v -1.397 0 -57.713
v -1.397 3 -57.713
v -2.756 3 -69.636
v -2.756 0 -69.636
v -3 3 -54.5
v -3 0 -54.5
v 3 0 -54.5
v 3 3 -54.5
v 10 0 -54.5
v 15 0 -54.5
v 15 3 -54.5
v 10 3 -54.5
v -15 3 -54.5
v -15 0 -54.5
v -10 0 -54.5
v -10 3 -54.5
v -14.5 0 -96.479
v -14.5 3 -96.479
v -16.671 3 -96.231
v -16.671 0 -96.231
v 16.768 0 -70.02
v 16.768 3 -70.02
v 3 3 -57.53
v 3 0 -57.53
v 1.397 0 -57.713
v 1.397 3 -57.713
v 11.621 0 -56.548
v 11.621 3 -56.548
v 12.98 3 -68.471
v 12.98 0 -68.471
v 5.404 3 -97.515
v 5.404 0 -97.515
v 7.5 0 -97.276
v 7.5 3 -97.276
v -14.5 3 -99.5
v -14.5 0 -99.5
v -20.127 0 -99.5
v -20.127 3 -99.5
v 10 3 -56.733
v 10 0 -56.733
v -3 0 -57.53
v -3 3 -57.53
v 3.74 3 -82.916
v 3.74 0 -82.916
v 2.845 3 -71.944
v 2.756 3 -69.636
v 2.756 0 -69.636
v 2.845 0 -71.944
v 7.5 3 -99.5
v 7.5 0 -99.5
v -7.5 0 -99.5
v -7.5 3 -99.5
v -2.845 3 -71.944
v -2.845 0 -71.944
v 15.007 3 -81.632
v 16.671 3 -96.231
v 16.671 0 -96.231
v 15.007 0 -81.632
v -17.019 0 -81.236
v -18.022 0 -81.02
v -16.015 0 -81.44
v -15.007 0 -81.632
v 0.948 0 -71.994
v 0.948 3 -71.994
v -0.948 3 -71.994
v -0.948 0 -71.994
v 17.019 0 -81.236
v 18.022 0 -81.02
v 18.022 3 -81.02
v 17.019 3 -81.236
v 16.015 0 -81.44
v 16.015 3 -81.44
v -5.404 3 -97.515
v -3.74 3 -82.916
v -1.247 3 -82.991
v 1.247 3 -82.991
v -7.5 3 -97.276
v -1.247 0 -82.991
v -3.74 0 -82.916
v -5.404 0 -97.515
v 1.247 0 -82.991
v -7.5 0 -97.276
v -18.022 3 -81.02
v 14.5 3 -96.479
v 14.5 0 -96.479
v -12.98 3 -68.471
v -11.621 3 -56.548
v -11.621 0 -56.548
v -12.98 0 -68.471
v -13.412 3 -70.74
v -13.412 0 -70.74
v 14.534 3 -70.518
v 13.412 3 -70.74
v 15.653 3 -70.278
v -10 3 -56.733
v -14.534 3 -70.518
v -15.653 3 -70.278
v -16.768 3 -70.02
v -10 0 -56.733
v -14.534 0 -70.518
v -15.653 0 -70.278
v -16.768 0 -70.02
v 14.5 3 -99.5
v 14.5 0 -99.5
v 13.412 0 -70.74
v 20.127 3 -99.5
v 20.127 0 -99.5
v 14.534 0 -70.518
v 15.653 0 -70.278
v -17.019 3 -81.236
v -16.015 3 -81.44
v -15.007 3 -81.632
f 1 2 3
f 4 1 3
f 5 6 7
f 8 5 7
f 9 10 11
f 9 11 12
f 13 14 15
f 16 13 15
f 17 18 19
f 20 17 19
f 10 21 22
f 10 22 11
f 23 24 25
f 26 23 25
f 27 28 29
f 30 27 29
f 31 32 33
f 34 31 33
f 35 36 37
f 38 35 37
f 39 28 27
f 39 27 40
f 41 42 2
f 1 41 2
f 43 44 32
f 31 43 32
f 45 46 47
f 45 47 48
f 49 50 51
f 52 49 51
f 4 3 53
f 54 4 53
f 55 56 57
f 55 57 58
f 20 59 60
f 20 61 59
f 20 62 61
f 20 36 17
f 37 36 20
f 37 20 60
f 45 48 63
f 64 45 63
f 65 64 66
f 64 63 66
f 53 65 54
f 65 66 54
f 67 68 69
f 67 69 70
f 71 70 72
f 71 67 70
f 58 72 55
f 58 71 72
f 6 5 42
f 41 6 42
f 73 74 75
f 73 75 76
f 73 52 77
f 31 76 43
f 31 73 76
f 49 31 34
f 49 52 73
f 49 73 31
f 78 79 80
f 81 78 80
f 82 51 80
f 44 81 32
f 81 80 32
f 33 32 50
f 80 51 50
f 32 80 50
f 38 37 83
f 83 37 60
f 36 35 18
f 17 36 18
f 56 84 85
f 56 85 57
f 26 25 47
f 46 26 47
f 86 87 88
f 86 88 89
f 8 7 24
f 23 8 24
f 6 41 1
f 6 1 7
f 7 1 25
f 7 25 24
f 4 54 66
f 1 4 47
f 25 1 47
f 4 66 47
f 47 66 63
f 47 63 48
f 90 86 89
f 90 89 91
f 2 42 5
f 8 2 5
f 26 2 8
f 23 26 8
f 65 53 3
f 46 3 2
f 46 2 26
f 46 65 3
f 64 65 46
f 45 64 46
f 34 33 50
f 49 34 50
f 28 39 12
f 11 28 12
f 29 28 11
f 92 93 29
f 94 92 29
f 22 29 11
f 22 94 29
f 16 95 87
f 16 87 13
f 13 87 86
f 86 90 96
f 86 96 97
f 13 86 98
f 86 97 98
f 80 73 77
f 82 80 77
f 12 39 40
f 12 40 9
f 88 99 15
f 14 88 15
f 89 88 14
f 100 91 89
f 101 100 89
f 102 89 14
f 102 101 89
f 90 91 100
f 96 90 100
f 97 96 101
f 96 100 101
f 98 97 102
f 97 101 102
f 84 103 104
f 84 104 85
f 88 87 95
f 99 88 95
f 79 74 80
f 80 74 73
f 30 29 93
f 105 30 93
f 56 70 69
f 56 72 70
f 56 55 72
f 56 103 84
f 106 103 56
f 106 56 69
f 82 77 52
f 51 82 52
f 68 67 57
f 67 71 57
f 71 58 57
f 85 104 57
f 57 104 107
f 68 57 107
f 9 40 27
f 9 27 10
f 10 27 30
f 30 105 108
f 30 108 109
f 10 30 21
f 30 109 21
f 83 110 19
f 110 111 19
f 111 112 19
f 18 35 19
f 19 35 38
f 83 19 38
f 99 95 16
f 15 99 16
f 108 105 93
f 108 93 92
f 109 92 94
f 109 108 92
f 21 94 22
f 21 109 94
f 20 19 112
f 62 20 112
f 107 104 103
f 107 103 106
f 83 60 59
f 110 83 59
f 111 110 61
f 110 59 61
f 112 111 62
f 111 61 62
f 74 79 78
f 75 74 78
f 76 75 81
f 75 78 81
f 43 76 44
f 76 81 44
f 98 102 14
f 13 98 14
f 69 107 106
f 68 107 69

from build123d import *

# Parameters (mm, degrees)
BOSS_EXTRUDE1_DEPTH      = 3
CUT_EXTRUDE1_DEPTH       = 102.55958965
BOSS_EXTRUDE2_DEPTH      = 3
CUT_EXTRUDE7_DEPTH       = 102.55958965
CUT_EXTRUDE9_DEPTH       = 102.55958965
MIRROR10_DEPTH           = 3
CUT_EXTRUDE10_DEPTH      = 102.55958965
CUT_EXTRUDE10_DEPTH_BACK = 102.55958965


# Read off the part's stored shape, not the designer's step: Mirror10
with BuildPart() as part:
    # Sketch1 → Boss-Extrude1 (new body)
    with BuildSketch(Plane(origin=(0, 0, 0), x_dir=(1, 0, 0), z_dir=(0, 1, 0))):
        Polygon((-20.127102374, 99.5), (-15, 54.5), (0, 54.5), (0, 99.5), align=None)
    extrude(amount=BOSS_EXTRUDE1_DEPTH)

    # Sketch2 → Cut-Extrude1 (cut, symmetric)
    with BuildSketch(Plane(origin=(0, 3, 0), x_dir=(1, 0, 0), z_dir=(0, 1, 0))):
        Polygon((-12.142737213, 56.488519479), (-0.87563237, 57.772243923), (-5.403760921, 97.515118151), (-16.670865764, 96.231393706), align=None)
    extrude(amount=CUT_EXTRUDE1_DEPTH, both=True, mode=Mode.SUBTRACT)

    # Sketch6 → Boss-Extrude2 (add)
    with BuildSketch(Plane(origin=(0, 3, 0), x_dir=(1, 0, 0), z_dir=(0, 1, 0))):
        Polygon((-12.142737213, 56.488519479), (-11.621111989, 56.547951167), (-12.979550554, 68.470813435), (-14.293598275, 75.366384737), align=None)
    boss_extrude2 = extrude(amount=-BOSS_EXTRUDE2_DEPTH)

    # Mirror3: Boss-Extrude2 across plane
    add(boss_extrude2.mirror(Plane(origin=(0, 0, 0), x_dir=(0.11320321376790746, 0, 0.9935718556765873), z_dir=(0.9935718556765875, 0, -0.11320321376790746))))

    # Sketch7 → Cut-Extrude7 (cut, symmetric)
    with BuildSketch(Plane(origin=(0, 3, 0), x_dir=(1, 0, 0), z_dir=(0, 1, 0))):
        Polygon((-14.5, 99.5), (-14.5, 96.478732618), (-7.5, 97.276281876), (-7.5, 99.5), align=None)
    extrude(amount=CUT_EXTRUDE7_DEPTH, both=True, mode=Mode.SUBTRACT)

    # Sketch14 → Cut-Extrude9 (cut, symmetric)
    with BuildSketch(Plane(origin=(0, 3, 0), x_dir=(1, 0, 0), z_dir=(0, 1, 0))):
        Polygon((-10, 56.732653547), (-10, 54.5), (-3, 54.5), (-3, 57.530202805), align=None)
    extrude(amount=CUT_EXTRUDE9_DEPTH, both=True, mode=Mode.SUBTRACT)


with BuildPart() as cut_extrude9_piece_1:
    # of the separate pieces the step leaves, piece 1, a body of its own (cut_extrude9_pieces)
    add(part.part.solids().sort_by_distance((-20.127102374, 0, -99.5))[0])


with BuildPart() as cut_extrude9_piece_2:
    # of the separate pieces the step leaves, piece 2, a body of its own (cut_extrude9_pieces)
    add(part.part.solids().sort_by_distance((-3, 0, -54.5))[0])

    # Mirror10 outline → Mirror10 (add)
    with BuildSketch(Plane(origin=(0, 0, 0), x_dir=(1, 0, 0), z_dir=(0, 1, 0))):
        Polygon((0, 54.5), (3, 54.5), (3, 57.530202805), (1.397257594, 57.712812236), (2.755696159, 69.635674504), (3.026493432, 76.650109181), (5.403760921, 97.515118151), (7.5, 97.276281876), (7.5, 99.5), (0, 99.5), align=None)
    extrude(amount=MIRROR10_DEPTH)


with BuildPart() as cut_extrude10_tool:
    # Sketch15 → Cut-Extrude10 (new, two sides: drawn at the far end of the back side and taken through both)
    with BuildSketch(Plane(origin=(0, 3, 0), x_dir=(1, 0, 0), z_dir=(0, 1, 0)).offset(-CUT_EXTRUDE10_DEPTH_BACK)):
        with BuildLine():
            Line((3.740364835, 82.915678077), (3.026493432, 76.650109181))
            Line((3.026493432, 76.650109181), (2.844802122, 71.94377736))
            ThreePointArc((2.844802122, 71.94377736), (-7.02787413, 71.656185952), (-16.768299937, 70.02016936))
            Line((-16.768299937, 70.02016936), (-18.021560353, 81.019894856))
            ThreePointArc((-18.021560353, 81.019894856), (-7.203237804, 82.686839129), (3.740364835, 82.915678077))
        make_face()
    extrude(amount=CUT_EXTRUDE10_DEPTH + CUT_EXTRUDE10_DEPTH_BACK)


with BuildPart() as cut_extrude9_piece_1_1:
    add(cut_extrude9_piece_1.part)

    # Cut-Extrude10: cut by cut_extrude10_tool
    add(cut_extrude10_tool.part, mode=Mode.SUBTRACT)


with BuildPart() as cut_extrude9_piece_2_1:
    add(cut_extrude9_piece_2.part)

    # Cut-Extrude10: cut by cut_extrude10_tool
    add(cut_extrude10_tool.part, mode=Mode.SUBTRACT)


with BuildPart() as cut_extrude10_piece_1:
    # of the separate pieces the step leaves, piece 1, a body of its own (cut_extrude10_pieces)
    add(cut_extrude9_piece_1_1.part.solids().sort_by_distance((-20.127102374, 0, -99.5))[0])


with BuildPart() as cut_extrude10_piece_2:
    # of the separate pieces the step leaves, piece 2, a body of its own (cut_extrude10_pieces)
    add(cut_extrude9_piece_1_1.part.solids().sort_by_distance((-16.768299937, 0, -70.02016936))[0])


with BuildPart() as cut_extrude10_piece_1_of_cut_extrude9_pi:
    # of the separate pieces the step leaves, piece 1, a body of its own (cut_extrude10_pieces_of_cut_extrude9_pie)
    add(cut_extrude9_piece_2_1.part.solids().sort_by_distance((-3.740364835, 0, -82.915678077))[0])


with BuildPart() as cut_extrude10_piece_2_of_cut_extrude9_pi:
    # of the separate pieces the step leaves, piece 2, a body of its own (cut_extrude10_pieces_of_cut_extrude9_pie)
    add(cut_extrude9_piece_2_1.part.solids().sort_by_distance((-3, 0, -54.5))[0])


with BuildPart() as body_5:
    # Mirror13: mirrored copy
    add(cut_extrude10_piece_1.part.mirror(Plane(origin=(0, 0, 0), x_dir=(0, 0, 1), z_dir=(1, 0, 0))))


with BuildPart() as body_6:
    # Mirror13 2: mirrored copy
    add(cut_extrude10_piece_2.part.mirror(Plane(origin=(0, 0, 0), x_dir=(0, 0, 1), z_dir=(1, 0, 0))))


solid = Compound([cut_extrude10_piece_1.part, cut_extrude10_piece_2.part, cut_extrude10_piece_1_of_cut_extrude9_pi.part, cut_extrude10_piece_2_of_cut_extrude9_pi.part, body_5.part, body_6.part])
